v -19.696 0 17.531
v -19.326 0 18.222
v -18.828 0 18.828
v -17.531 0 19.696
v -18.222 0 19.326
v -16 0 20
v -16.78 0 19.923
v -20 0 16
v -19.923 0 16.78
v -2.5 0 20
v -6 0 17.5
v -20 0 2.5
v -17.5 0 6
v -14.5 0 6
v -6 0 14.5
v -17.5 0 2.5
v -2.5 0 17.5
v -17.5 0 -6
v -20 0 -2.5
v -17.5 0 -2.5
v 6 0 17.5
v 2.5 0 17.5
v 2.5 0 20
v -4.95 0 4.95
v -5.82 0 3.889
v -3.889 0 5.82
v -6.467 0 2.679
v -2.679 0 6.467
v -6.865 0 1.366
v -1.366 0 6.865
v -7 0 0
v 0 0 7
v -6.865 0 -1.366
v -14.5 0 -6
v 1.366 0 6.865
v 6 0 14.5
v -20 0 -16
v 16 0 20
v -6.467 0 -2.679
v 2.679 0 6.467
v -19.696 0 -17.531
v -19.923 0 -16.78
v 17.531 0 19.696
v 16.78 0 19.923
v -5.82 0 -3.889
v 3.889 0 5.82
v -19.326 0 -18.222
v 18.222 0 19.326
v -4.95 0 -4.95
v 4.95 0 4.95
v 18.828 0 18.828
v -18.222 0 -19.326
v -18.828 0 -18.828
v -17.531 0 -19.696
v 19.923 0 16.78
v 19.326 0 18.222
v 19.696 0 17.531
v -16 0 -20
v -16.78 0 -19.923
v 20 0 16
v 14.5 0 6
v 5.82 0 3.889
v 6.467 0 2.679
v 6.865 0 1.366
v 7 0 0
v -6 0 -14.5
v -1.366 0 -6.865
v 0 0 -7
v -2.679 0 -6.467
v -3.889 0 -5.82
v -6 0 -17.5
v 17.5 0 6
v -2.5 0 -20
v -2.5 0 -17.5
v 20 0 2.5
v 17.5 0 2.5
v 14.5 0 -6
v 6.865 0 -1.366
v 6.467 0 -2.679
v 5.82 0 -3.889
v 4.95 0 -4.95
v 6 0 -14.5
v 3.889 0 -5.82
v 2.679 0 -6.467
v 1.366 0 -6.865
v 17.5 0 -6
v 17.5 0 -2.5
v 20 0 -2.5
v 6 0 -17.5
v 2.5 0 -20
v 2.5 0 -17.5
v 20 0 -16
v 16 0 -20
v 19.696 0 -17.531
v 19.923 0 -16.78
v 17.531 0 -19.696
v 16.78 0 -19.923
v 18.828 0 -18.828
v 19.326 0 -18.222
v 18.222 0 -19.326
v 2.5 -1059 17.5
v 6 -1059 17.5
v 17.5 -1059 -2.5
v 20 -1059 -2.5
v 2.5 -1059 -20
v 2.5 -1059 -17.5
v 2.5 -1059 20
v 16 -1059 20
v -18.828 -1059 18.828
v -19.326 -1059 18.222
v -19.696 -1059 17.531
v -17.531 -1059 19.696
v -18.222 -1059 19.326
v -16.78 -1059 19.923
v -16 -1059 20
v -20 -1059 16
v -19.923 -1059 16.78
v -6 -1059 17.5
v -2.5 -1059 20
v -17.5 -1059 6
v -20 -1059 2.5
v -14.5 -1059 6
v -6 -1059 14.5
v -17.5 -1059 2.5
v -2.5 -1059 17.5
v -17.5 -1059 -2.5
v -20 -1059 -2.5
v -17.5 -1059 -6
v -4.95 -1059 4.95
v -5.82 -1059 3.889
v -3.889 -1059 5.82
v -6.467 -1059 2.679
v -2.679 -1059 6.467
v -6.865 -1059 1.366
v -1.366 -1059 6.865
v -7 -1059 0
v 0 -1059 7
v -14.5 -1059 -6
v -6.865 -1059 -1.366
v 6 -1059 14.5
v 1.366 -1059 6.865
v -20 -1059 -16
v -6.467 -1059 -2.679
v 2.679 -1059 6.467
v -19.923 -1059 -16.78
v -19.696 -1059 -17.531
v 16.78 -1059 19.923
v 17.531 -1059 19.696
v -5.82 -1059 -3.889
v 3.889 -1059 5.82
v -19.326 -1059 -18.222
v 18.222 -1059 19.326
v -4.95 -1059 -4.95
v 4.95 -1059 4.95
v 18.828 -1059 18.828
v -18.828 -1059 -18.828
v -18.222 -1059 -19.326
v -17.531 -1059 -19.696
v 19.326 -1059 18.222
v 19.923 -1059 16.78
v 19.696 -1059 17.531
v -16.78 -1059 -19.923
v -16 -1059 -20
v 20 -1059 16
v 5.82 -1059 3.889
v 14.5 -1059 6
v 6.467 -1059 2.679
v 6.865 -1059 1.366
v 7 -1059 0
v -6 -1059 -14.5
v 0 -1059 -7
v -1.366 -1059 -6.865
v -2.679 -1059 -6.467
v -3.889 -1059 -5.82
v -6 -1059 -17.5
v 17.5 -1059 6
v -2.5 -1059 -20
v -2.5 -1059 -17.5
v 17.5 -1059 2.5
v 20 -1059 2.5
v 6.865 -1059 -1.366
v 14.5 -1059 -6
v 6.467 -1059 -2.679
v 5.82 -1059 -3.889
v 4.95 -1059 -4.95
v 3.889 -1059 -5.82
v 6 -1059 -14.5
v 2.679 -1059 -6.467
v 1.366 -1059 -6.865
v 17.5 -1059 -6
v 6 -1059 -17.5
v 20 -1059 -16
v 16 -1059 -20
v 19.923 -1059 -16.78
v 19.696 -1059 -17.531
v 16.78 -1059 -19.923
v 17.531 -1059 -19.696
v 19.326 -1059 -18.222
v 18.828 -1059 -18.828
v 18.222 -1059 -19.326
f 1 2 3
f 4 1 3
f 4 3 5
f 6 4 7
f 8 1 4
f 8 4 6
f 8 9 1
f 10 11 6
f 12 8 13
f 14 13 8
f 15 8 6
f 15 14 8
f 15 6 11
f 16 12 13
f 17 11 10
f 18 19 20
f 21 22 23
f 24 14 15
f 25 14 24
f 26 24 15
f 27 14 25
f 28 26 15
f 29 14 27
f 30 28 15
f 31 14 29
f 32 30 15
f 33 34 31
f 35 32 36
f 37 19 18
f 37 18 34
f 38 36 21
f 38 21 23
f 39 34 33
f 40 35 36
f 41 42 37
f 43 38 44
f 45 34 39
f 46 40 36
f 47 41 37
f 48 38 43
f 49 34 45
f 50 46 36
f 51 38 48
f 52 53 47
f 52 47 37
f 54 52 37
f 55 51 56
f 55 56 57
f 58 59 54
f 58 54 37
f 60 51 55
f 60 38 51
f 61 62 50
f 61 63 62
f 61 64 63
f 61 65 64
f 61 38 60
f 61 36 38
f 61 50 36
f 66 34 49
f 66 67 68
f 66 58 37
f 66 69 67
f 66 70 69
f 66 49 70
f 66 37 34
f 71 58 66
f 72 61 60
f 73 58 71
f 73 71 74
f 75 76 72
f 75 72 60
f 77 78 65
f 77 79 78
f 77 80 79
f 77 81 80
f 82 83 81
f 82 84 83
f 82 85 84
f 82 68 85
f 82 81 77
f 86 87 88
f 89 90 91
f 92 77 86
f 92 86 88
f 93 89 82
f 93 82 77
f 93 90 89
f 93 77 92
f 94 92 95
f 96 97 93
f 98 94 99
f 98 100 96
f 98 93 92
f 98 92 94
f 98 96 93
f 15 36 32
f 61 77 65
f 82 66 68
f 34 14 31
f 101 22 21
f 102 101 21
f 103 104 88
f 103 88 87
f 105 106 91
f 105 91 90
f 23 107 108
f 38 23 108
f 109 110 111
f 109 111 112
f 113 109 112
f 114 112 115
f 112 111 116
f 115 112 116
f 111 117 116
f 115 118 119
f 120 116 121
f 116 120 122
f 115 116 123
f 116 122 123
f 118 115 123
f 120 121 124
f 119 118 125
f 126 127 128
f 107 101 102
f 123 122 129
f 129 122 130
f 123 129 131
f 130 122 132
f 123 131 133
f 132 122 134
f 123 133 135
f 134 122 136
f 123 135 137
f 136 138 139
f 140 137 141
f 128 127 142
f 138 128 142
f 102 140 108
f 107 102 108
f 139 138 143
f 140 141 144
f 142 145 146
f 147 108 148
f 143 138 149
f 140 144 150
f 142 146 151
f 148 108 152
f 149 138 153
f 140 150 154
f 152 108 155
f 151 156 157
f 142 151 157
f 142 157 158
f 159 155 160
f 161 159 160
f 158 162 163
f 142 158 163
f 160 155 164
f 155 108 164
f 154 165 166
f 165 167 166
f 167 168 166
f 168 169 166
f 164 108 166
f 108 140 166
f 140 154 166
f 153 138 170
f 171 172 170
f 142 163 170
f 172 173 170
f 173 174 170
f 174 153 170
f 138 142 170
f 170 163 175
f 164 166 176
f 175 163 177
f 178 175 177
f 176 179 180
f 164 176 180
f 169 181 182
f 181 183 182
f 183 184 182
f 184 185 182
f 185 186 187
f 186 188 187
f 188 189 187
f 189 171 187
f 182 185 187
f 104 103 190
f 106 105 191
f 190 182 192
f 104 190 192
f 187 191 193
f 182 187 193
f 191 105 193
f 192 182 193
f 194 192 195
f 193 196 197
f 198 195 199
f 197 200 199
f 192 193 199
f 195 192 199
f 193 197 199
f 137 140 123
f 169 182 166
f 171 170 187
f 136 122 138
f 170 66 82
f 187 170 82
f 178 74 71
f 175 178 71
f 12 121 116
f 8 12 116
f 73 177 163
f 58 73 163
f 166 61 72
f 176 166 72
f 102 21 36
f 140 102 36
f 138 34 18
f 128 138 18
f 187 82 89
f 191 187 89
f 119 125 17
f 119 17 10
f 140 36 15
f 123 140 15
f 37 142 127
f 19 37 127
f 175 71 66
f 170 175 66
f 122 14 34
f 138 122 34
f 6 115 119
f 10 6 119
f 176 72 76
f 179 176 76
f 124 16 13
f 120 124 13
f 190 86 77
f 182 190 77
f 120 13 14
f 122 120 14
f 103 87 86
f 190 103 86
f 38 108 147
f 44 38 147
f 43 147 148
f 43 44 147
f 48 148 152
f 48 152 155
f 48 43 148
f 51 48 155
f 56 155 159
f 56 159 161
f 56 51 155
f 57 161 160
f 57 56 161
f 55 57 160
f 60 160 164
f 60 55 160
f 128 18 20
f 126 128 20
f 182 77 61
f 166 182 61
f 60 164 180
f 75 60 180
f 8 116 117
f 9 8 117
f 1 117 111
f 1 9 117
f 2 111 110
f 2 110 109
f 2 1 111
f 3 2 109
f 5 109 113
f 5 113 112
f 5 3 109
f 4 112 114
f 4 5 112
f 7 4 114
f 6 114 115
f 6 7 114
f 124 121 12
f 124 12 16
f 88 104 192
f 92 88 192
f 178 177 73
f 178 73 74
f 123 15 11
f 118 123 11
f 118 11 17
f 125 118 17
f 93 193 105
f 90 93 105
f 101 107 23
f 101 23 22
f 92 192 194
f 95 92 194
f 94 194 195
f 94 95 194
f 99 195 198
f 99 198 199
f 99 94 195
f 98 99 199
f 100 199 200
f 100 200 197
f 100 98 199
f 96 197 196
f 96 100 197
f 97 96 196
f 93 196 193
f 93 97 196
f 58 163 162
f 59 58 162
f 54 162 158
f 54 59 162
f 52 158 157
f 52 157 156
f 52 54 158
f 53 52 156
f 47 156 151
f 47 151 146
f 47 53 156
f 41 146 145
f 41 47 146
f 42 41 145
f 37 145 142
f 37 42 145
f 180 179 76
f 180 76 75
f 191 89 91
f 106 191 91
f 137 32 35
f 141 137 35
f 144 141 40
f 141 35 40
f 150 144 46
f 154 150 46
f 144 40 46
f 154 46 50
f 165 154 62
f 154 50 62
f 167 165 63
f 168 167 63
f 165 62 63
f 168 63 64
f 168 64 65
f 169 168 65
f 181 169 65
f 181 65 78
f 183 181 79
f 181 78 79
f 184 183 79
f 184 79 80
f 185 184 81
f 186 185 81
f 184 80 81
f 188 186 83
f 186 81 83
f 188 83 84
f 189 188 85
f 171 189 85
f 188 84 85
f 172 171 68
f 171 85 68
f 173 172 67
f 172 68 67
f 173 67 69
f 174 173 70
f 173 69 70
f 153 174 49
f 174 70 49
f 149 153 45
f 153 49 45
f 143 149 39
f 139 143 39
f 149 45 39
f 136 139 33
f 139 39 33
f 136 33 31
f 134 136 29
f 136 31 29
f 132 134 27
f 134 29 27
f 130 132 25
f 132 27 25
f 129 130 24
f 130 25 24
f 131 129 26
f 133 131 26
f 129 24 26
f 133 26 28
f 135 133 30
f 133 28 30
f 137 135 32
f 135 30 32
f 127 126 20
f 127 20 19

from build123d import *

# Parameters (mm, degrees)
SKETCH2_R         = 7
EXTRUDE1_DEPTH    = 1059
EXTRUDE2_DEPTH    = 1060.377647489
CIRPATTERN1_COUNT = 4


with BuildPart() as part:
    # Sketch2 → Extrude1 (new body)
    with BuildSketch(Plane(origin=(0, 0, 0), x_dir=(1, 0, 0), z_dir=(0, 1, 0))):
        with BuildLine():
            Line((-16, -20), (16, -20))
            ThreePointArc((16, -20), (18.828427125, -18.828427125), (20, -16))
            Line((20, -16), (20, 16))
            ThreePointArc((20, 16), (18.828427125, 18.828427125), (16, 20))
            Line((16, 20), (-16, 20))
            ThreePointArc((-16, 20), (-18.828427125, 18.828427125), (-20, 16))
            Line((-20, 16), (-20, -16))
            ThreePointArc((-20, -16), (-18.828427125, -18.828427125), (-16, -20))
        make_face()
        Circle(SKETCH2_R, mode=Mode.SUBTRACT)
    extrude(amount=-EXTRUDE1_DEPTH)

    # Sketch3 → Extrude2 (cut, through all)
    with BuildSketch(Plane(origin=(0, 0, 0), x_dir=(1, 0, 0), z_dir=(0, 1, 0))):
        Polygon((-2.5, 20), (-2.5, 17.5), (-6, 17.5), (-6, 14.5), (6, 14.5), (6, 17.5), (2.5, 17.5), (2.5, 20), align=None)
    extrude2 = extrude(amount=-EXTRUDE2_DEPTH, mode=Mode.SUBTRACT)

    # CirPattern1: Extrude2 ×4 about axis
    cirpattern1_axis = Axis((0, 3.5, 0), (0, -1, 0))
    for i in range(1, CIRPATTERN1_COUNT):
        add(extrude2.rotate(cirpattern1_axis, i * 360 / CIRPATTERN1_COUNT), mode=Mode.SUBTRACT)


solid = part.part
